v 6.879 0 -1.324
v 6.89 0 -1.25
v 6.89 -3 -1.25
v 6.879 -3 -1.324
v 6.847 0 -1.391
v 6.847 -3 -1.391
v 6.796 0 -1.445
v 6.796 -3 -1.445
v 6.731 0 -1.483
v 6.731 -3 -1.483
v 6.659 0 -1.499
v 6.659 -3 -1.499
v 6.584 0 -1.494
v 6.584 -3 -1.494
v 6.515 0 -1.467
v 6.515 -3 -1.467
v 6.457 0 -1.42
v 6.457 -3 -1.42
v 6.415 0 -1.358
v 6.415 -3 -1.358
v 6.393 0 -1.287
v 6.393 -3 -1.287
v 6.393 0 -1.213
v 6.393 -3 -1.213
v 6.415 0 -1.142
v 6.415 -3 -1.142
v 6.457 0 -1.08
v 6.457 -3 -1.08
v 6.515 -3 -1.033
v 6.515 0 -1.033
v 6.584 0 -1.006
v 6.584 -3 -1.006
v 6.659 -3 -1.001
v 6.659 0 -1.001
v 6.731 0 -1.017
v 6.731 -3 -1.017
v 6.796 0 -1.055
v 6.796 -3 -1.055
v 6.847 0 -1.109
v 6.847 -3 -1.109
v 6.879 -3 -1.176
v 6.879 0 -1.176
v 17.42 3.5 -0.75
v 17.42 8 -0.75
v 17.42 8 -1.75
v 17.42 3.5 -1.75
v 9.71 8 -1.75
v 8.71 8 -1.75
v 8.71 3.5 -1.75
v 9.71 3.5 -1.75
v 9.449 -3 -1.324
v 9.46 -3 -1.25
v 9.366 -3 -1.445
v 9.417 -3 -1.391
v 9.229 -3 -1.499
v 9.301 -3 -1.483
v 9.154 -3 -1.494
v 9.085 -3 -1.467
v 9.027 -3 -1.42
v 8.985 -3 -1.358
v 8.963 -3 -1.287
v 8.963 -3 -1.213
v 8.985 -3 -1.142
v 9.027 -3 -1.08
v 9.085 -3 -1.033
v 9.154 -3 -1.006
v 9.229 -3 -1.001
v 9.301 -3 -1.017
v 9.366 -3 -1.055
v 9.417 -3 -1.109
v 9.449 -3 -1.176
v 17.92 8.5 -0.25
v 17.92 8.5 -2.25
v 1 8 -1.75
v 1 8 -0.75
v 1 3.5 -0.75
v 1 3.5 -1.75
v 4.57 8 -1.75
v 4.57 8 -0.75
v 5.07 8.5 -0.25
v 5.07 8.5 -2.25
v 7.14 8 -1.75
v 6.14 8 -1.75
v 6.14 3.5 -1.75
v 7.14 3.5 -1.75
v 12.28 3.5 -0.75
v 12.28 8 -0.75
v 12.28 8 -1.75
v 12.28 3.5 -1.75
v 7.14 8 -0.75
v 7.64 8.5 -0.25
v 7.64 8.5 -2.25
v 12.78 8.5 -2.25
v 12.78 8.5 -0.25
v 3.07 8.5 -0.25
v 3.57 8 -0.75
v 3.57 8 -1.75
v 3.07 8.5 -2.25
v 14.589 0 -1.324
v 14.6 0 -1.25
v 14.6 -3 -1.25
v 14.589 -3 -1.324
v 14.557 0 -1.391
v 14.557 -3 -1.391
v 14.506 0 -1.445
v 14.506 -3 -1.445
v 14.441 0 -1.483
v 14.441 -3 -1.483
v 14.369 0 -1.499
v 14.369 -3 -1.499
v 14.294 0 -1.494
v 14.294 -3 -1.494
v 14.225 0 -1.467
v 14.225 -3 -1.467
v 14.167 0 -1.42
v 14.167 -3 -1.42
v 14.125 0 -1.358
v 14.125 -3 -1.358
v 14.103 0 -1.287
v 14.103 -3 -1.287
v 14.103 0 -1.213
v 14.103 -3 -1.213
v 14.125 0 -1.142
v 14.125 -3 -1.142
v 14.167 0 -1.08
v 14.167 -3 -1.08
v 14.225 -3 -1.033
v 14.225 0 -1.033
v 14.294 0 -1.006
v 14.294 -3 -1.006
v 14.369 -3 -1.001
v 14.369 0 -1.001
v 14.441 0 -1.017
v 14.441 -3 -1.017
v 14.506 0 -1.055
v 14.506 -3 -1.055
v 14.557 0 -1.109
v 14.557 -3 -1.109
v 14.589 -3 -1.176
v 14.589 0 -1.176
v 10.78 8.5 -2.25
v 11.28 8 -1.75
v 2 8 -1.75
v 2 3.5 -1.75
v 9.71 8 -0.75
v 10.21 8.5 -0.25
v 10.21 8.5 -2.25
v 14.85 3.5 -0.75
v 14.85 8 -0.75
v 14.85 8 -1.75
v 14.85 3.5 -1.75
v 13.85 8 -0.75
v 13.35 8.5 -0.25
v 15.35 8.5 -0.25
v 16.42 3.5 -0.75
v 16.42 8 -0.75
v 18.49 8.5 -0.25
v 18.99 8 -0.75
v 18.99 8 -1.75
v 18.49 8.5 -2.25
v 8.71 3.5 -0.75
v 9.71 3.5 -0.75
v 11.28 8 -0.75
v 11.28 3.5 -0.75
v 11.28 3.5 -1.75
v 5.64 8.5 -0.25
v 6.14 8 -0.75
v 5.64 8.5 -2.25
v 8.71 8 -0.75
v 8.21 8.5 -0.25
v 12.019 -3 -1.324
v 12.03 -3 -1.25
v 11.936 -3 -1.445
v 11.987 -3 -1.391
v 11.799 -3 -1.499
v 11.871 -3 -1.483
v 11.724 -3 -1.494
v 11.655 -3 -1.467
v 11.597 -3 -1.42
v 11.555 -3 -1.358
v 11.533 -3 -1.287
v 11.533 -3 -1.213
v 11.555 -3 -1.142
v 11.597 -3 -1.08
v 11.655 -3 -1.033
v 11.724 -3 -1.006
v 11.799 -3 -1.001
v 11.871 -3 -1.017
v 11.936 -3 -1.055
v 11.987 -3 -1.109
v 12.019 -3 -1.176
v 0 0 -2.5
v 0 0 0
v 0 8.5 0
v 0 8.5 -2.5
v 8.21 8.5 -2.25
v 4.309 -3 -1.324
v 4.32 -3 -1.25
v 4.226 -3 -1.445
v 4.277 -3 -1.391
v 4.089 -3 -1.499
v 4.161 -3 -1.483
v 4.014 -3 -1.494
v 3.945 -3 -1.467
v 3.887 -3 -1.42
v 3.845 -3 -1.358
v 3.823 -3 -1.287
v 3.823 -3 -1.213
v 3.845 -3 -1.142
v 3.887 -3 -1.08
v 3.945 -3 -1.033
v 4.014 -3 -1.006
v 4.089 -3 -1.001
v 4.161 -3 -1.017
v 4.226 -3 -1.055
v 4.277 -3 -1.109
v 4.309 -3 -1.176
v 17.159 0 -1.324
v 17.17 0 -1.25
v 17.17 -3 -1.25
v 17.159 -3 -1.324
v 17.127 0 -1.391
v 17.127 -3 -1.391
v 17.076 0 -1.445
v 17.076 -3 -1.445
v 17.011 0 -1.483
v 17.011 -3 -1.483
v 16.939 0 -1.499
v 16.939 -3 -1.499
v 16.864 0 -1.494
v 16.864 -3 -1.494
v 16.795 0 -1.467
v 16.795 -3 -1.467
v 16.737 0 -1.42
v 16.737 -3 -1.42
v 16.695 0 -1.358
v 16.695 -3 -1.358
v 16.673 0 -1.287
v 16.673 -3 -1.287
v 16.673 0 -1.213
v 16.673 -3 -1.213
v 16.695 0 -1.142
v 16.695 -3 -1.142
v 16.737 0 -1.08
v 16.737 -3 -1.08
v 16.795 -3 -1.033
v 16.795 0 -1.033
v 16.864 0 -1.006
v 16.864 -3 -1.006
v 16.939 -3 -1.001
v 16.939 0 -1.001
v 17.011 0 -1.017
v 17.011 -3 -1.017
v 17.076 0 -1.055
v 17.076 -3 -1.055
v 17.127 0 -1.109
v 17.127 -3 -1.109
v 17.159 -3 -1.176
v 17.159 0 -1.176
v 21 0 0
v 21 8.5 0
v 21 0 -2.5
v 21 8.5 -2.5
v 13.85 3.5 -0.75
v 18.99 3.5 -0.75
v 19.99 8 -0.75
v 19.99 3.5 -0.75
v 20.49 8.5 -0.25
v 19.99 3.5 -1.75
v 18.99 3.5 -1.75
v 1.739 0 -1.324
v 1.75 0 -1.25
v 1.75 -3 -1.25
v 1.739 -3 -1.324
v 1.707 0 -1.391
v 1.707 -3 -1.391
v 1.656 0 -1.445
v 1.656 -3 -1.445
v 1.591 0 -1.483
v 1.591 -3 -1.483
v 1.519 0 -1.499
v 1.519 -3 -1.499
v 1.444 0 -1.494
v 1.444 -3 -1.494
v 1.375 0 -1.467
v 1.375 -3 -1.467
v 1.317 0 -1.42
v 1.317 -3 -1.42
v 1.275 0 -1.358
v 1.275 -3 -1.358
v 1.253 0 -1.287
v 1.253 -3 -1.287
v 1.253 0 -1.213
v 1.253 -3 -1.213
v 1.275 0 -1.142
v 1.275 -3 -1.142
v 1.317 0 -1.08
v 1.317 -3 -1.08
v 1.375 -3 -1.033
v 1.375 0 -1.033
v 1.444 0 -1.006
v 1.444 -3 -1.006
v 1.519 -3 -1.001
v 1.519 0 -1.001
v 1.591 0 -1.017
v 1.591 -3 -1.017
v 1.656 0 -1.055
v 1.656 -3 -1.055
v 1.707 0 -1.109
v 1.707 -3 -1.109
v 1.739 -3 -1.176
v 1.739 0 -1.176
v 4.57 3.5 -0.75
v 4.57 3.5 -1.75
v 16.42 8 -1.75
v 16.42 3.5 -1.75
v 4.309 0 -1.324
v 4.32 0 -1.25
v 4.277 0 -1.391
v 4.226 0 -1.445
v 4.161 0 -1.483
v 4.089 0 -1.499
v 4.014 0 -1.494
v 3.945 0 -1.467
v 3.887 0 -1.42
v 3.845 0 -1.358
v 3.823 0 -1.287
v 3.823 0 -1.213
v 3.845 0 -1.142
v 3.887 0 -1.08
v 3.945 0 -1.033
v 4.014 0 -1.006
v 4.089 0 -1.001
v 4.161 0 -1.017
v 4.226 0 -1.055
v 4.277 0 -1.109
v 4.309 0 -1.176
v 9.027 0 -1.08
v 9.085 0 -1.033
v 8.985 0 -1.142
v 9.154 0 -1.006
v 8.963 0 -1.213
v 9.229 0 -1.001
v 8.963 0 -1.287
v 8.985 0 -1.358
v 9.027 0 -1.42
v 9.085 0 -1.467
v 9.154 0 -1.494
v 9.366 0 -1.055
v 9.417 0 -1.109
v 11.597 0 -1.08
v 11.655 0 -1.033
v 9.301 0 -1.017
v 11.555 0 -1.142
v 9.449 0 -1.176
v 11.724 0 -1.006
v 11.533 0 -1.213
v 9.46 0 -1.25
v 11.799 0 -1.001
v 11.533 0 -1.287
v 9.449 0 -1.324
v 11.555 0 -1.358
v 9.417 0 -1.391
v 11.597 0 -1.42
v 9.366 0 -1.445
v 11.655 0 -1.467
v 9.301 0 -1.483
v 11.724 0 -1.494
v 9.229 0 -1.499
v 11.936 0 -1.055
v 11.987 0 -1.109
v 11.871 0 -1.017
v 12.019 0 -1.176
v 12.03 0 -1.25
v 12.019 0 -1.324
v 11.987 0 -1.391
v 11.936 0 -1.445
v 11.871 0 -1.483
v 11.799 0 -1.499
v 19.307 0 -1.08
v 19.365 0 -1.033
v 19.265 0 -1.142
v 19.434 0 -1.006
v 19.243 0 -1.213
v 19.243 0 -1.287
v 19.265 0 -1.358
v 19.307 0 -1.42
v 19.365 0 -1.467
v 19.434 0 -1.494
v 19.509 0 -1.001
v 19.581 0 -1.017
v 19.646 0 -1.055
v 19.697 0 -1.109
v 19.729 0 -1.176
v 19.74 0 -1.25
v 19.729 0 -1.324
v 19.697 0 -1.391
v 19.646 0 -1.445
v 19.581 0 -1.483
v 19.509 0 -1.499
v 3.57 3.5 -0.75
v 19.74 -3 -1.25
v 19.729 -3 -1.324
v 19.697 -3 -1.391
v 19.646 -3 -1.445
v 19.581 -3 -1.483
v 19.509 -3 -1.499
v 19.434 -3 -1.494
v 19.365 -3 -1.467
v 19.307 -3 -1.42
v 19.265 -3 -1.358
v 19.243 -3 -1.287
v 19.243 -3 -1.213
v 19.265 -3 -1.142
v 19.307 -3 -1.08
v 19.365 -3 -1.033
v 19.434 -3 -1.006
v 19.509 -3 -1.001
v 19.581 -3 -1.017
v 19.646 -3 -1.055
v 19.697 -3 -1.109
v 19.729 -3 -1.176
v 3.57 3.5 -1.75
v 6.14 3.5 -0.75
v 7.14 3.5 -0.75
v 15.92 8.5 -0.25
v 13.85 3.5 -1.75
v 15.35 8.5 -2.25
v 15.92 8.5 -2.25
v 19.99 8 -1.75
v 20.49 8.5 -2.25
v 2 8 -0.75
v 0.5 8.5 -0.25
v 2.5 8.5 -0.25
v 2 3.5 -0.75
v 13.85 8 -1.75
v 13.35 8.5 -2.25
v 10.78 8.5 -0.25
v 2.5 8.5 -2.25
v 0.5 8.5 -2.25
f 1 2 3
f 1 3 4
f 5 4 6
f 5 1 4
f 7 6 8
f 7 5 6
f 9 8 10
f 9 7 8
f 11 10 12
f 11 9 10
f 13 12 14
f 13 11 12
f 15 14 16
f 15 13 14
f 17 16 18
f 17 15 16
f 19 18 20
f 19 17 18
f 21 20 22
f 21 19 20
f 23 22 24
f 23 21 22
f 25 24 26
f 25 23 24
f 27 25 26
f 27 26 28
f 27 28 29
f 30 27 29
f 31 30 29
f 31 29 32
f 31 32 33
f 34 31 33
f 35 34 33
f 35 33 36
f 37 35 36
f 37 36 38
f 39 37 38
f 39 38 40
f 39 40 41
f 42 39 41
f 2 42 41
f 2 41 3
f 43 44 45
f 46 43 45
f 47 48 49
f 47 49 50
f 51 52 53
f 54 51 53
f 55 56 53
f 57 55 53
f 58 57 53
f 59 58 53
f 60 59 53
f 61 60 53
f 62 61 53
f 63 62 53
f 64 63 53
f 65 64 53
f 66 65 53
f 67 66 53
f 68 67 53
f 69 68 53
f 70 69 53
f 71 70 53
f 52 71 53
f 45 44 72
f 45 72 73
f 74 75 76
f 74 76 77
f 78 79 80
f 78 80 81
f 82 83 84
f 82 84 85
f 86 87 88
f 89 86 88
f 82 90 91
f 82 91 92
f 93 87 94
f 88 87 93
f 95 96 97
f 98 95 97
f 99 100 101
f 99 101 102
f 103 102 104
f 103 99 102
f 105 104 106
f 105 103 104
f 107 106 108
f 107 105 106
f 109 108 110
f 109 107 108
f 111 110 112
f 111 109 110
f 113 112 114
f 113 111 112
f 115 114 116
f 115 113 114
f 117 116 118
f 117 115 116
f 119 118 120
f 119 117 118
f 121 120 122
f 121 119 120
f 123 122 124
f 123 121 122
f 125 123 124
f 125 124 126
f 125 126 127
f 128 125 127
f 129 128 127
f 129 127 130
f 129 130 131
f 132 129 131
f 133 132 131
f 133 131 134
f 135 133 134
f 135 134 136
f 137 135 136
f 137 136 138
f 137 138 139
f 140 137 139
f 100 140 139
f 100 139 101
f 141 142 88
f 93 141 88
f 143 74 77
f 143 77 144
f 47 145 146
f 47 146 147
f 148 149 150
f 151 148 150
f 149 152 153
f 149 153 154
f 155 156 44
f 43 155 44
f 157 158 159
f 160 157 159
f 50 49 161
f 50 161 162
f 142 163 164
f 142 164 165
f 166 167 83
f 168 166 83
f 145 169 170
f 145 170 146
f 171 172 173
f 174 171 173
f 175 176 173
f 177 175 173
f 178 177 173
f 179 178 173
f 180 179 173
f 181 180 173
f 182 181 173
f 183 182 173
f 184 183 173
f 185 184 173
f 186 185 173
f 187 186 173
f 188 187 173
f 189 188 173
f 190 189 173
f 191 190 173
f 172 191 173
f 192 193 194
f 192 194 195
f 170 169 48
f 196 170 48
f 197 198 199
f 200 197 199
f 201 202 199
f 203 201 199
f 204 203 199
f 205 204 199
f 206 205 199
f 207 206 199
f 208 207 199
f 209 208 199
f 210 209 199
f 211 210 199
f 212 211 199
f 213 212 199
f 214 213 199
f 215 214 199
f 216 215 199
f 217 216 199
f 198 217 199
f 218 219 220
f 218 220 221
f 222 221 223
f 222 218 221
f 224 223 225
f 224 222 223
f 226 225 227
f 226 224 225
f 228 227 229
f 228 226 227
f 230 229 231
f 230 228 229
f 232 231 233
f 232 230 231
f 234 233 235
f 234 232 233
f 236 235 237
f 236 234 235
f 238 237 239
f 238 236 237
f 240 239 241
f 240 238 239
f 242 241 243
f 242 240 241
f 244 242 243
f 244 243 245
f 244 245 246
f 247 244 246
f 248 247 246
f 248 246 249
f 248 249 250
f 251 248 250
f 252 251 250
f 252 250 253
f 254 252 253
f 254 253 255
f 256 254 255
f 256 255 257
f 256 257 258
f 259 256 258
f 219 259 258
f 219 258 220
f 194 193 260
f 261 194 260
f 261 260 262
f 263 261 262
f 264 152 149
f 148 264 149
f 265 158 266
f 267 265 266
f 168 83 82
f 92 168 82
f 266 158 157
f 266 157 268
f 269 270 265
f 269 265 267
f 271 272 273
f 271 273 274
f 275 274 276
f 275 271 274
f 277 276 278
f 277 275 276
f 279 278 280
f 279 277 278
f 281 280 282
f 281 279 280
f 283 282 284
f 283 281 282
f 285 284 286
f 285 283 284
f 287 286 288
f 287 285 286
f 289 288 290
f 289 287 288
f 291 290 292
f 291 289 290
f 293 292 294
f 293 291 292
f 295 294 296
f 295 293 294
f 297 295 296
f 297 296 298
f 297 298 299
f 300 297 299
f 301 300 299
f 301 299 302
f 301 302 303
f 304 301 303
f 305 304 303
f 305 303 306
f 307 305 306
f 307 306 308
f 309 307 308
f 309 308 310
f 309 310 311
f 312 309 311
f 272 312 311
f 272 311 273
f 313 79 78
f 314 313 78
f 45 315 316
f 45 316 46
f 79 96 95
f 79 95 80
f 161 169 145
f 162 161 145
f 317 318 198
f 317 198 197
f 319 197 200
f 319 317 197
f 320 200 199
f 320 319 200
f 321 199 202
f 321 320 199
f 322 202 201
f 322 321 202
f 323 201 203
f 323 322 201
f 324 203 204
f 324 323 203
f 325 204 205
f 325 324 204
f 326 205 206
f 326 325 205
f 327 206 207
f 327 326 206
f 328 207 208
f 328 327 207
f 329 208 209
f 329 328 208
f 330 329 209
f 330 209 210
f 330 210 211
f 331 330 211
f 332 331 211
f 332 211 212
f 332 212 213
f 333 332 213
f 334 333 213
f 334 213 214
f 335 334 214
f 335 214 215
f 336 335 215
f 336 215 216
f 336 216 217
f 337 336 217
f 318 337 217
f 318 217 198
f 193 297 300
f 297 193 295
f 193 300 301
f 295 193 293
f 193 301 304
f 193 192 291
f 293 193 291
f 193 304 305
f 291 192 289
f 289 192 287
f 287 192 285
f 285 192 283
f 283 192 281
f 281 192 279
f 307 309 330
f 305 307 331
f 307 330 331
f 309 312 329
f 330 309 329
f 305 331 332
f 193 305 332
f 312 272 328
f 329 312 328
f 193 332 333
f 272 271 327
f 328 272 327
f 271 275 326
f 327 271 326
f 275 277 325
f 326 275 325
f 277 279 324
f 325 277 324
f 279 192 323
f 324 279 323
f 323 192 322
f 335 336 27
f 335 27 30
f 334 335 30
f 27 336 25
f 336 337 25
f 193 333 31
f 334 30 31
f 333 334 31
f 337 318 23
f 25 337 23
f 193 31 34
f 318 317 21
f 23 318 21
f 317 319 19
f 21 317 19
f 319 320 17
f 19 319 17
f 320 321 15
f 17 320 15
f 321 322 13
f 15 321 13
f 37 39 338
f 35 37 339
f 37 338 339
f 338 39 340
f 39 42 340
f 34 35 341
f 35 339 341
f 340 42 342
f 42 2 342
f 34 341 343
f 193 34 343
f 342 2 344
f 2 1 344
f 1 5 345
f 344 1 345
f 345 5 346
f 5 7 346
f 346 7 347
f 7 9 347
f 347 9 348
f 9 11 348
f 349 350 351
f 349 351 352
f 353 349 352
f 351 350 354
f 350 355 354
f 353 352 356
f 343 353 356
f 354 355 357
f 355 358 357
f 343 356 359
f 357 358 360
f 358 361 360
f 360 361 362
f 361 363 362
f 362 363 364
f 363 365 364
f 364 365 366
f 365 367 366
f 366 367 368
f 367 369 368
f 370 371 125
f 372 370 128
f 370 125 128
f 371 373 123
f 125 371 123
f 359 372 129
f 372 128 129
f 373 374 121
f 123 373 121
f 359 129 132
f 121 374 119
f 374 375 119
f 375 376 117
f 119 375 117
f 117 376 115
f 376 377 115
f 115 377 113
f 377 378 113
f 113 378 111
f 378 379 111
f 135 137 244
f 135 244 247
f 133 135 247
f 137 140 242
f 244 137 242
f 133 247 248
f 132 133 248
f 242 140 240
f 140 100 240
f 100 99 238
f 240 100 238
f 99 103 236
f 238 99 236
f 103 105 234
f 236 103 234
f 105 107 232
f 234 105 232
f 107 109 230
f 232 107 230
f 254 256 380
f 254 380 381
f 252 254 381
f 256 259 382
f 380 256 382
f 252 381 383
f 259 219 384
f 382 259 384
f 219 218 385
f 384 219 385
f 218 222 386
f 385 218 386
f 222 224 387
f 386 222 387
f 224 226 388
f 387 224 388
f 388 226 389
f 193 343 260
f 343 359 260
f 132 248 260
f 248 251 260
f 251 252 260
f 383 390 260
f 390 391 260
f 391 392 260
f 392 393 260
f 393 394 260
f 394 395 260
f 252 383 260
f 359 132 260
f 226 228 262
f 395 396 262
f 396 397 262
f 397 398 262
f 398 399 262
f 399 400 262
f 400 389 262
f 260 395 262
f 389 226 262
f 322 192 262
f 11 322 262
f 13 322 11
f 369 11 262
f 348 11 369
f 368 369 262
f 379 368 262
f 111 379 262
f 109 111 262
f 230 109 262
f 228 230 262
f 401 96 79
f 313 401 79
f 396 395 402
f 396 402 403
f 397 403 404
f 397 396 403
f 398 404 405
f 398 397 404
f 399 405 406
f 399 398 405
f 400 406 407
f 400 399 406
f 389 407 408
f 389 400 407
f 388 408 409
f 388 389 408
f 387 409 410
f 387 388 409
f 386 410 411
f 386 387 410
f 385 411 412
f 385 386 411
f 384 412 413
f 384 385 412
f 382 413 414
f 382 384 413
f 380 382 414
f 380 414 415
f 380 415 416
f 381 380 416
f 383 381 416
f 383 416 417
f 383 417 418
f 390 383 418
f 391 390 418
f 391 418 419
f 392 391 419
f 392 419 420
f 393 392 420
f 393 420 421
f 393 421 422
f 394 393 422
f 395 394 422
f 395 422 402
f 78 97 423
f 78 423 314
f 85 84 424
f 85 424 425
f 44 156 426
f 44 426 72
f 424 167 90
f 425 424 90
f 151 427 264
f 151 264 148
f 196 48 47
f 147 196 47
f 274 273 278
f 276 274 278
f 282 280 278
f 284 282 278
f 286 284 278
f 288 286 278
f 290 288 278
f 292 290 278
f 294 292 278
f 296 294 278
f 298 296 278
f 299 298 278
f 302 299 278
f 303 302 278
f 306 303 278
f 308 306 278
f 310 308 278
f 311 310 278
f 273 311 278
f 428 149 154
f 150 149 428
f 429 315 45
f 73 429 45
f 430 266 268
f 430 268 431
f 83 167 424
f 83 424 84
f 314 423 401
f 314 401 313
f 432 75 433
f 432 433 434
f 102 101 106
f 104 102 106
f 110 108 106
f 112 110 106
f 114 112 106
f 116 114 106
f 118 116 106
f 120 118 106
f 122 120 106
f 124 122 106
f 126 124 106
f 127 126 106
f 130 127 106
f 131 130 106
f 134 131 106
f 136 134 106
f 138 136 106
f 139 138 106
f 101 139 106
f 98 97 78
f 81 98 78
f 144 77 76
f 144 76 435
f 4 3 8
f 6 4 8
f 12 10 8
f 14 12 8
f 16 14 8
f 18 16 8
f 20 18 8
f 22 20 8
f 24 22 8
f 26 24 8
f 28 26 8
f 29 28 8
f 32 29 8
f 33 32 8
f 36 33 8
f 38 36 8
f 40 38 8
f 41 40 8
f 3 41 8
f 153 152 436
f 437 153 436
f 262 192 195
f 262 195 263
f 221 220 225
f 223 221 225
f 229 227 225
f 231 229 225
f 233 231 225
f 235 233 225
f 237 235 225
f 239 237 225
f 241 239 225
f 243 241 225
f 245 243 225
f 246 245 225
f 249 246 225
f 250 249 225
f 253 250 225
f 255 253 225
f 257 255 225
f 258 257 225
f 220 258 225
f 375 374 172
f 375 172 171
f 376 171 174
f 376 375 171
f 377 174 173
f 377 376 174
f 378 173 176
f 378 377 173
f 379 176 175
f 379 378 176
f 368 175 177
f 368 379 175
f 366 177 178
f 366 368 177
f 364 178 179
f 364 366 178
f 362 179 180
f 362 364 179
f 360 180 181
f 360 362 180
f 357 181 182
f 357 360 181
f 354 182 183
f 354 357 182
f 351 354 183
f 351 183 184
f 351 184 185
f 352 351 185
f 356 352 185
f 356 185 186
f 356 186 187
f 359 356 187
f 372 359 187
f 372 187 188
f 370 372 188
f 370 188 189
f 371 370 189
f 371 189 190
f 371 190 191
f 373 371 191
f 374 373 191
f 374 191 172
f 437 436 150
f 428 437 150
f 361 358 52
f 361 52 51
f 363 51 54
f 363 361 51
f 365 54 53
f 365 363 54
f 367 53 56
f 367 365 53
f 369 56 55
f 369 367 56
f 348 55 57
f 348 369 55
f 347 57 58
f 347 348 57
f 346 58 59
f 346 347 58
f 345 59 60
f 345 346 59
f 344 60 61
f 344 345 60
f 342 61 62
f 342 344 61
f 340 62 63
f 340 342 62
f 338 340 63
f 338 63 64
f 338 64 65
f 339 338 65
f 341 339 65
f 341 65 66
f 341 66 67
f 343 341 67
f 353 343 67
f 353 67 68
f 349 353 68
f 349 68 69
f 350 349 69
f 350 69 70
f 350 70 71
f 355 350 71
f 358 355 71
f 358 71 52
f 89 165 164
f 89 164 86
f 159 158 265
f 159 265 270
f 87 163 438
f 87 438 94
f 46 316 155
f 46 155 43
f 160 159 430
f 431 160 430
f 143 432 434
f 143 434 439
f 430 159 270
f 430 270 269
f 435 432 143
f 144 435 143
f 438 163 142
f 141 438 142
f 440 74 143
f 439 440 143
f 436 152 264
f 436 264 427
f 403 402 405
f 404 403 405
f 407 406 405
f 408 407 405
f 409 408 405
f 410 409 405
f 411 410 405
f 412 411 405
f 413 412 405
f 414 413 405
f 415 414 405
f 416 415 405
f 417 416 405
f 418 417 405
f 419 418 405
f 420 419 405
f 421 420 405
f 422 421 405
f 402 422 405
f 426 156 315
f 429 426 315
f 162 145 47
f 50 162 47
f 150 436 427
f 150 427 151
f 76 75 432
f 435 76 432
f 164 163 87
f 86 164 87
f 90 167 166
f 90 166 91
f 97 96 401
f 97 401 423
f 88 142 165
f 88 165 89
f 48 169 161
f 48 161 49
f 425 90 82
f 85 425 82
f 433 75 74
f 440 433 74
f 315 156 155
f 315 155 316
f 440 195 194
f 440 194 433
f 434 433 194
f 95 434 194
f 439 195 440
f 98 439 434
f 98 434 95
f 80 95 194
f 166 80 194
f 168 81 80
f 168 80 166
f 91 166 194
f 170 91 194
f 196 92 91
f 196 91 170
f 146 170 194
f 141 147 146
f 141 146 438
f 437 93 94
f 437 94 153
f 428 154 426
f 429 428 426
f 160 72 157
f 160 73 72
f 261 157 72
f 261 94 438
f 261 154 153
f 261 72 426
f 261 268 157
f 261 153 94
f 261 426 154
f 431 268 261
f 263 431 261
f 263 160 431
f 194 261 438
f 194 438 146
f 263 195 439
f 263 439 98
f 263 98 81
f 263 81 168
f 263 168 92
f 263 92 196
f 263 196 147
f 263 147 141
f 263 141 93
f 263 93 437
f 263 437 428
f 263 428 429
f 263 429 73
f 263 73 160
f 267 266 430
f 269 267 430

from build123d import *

# Parameters (mm, degrees)
SKETCH1_W           = 21
SKETCH1_H           = 2.5
BOSS_EXTRUDE1_DEPTH = 8.5
SKETCH2_W           = 1
SKETCH2_H           = 1
CUT_EXTRUDE1_DEPTH  = 5
CHAMFER1_SIZE       = 0.5
SKETCH4_R           = 0.25
BOSS_EXTRUDE2_DEPTH = 6.5


with BuildPart() as part:
    # Sketch1 → Boss-Extrude1 (new body)
    with BuildSketch(Plane(origin=(0, 0, 0), x_dir=(1, 0, 0), z_dir=(0, 1, 0))):
        with Locations((10.5, 1.25)):
            Rectangle(SKETCH1_W, SKETCH1_H)
    extrude(amount=BOSS_EXTRUDE1_DEPTH)

    # Sketch2 → Cut-Extrude1 (cut)
    with BuildSketch(Plane(origin=(0, 8.5, 0), x_dir=(1, 0, 0), z_dir=(0, 1, 0))):
        with Locations((1.5, 1.25)):
            Rectangle(SKETCH2_W, SKETCH2_H)
        with Locations((4.07, 1.25)):
            Rectangle(SKETCH2_W, SKETCH2_H)
        with Locations((6.64, 1.25)):
            Rectangle(SKETCH2_W, SKETCH2_H)
        with Locations((9.21, 1.25)):
            Rectangle(SKETCH2_W, SKETCH2_H)
        with Locations((11.78, 1.25)):
            Rectangle(SKETCH2_W, SKETCH2_H)
        with Locations((14.35, 1.25)):
            Rectangle(SKETCH2_W, SKETCH2_H)
        with Locations((16.92, 1.25)):
            Rectangle(SKETCH2_W, SKETCH2_H)
        with Locations((19.49, 1.25)):
            Rectangle(SKETCH2_W, SKETCH2_H)
    extrude(amount=-CUT_EXTRUDE1_DEPTH, mode=Mode.SUBTRACT)

    # Chamfer1
    chamfer1_edges = [part.edges().sort_by_distance(p)[0] for p in [
        (1, 8.5, -1.25),
        (1.5, 8.5, -0.75),
        (2, 8.5, -1.25),
        (1.5, 8.5, -1.75),
        (3.57, 8.5, -1.25),
        (4.07, 8.5, -0.75),
        (4.57, 8.5, -1.25),
        (4.07, 8.5, -1.75),
        (6.14, 8.5, -1.25),
        (6.64, 8.5, -0.75),
        (7.14, 8.5, -1.25),
        (6.64, 8.5, -1.75),
        (8.71, 8.5, -1.25),
        (9.21, 8.5, -0.75),
        (9.71, 8.5, -1.25),
        (9.21, 8.5, -1.75),
        (11.28, 8.5, -1.25),
        (11.78, 8.5, -0.75),
        (12.28, 8.5, -1.25),
        (11.78, 8.5, -1.75),
        (13.85, 8.5, -1.25),
        (14.35, 8.5, -0.75),
        (14.85, 8.5, -1.25),
        (14.35, 8.5, -1.75),
        (16.42, 8.5, -1.25),
        (16.92, 8.5, -0.75),
        (17.42, 8.5, -1.25),
        (16.92, 8.5, -1.75),
        (18.99, 8.5, -1.25),
        (19.49, 8.5, -0.75),
        (19.99, 8.5, -1.25),
        (19.49, 8.5, -1.75),
    ]]
    chamfer(chamfer1_edges, length=CHAMFER1_SIZE)

    # Sketch4 → Boss-Extrude2 (add)
    with BuildSketch(Plane(origin=(0, 3.5, 0), x_dir=(1, 0, 0), z_dir=(0, 1, 0))):
        with Locations((1.5, 1.25)):
            Circle(SKETCH4_R)
        with Locations((4.07, 1.25)):
            Circle(SKETCH4_R)
        with Locations((6.64, 1.25)):
            Circle(SKETCH4_R)
        with Locations((9.21, 1.25)):
            Circle(SKETCH4_R)
        with Locations((11.78, 1.25)):
            Circle(SKETCH4_R)
        with Locations((14.35, 1.25)):
            Circle(SKETCH4_R)
        with Locations((16.92, 1.25)):
            Circle(SKETCH4_R)
        with Locations((19.49, 1.25)):
            Circle(SKETCH4_R)
    extrude(amount=-BOSS_EXTRUDE2_DEPTH)


solid = part.part
